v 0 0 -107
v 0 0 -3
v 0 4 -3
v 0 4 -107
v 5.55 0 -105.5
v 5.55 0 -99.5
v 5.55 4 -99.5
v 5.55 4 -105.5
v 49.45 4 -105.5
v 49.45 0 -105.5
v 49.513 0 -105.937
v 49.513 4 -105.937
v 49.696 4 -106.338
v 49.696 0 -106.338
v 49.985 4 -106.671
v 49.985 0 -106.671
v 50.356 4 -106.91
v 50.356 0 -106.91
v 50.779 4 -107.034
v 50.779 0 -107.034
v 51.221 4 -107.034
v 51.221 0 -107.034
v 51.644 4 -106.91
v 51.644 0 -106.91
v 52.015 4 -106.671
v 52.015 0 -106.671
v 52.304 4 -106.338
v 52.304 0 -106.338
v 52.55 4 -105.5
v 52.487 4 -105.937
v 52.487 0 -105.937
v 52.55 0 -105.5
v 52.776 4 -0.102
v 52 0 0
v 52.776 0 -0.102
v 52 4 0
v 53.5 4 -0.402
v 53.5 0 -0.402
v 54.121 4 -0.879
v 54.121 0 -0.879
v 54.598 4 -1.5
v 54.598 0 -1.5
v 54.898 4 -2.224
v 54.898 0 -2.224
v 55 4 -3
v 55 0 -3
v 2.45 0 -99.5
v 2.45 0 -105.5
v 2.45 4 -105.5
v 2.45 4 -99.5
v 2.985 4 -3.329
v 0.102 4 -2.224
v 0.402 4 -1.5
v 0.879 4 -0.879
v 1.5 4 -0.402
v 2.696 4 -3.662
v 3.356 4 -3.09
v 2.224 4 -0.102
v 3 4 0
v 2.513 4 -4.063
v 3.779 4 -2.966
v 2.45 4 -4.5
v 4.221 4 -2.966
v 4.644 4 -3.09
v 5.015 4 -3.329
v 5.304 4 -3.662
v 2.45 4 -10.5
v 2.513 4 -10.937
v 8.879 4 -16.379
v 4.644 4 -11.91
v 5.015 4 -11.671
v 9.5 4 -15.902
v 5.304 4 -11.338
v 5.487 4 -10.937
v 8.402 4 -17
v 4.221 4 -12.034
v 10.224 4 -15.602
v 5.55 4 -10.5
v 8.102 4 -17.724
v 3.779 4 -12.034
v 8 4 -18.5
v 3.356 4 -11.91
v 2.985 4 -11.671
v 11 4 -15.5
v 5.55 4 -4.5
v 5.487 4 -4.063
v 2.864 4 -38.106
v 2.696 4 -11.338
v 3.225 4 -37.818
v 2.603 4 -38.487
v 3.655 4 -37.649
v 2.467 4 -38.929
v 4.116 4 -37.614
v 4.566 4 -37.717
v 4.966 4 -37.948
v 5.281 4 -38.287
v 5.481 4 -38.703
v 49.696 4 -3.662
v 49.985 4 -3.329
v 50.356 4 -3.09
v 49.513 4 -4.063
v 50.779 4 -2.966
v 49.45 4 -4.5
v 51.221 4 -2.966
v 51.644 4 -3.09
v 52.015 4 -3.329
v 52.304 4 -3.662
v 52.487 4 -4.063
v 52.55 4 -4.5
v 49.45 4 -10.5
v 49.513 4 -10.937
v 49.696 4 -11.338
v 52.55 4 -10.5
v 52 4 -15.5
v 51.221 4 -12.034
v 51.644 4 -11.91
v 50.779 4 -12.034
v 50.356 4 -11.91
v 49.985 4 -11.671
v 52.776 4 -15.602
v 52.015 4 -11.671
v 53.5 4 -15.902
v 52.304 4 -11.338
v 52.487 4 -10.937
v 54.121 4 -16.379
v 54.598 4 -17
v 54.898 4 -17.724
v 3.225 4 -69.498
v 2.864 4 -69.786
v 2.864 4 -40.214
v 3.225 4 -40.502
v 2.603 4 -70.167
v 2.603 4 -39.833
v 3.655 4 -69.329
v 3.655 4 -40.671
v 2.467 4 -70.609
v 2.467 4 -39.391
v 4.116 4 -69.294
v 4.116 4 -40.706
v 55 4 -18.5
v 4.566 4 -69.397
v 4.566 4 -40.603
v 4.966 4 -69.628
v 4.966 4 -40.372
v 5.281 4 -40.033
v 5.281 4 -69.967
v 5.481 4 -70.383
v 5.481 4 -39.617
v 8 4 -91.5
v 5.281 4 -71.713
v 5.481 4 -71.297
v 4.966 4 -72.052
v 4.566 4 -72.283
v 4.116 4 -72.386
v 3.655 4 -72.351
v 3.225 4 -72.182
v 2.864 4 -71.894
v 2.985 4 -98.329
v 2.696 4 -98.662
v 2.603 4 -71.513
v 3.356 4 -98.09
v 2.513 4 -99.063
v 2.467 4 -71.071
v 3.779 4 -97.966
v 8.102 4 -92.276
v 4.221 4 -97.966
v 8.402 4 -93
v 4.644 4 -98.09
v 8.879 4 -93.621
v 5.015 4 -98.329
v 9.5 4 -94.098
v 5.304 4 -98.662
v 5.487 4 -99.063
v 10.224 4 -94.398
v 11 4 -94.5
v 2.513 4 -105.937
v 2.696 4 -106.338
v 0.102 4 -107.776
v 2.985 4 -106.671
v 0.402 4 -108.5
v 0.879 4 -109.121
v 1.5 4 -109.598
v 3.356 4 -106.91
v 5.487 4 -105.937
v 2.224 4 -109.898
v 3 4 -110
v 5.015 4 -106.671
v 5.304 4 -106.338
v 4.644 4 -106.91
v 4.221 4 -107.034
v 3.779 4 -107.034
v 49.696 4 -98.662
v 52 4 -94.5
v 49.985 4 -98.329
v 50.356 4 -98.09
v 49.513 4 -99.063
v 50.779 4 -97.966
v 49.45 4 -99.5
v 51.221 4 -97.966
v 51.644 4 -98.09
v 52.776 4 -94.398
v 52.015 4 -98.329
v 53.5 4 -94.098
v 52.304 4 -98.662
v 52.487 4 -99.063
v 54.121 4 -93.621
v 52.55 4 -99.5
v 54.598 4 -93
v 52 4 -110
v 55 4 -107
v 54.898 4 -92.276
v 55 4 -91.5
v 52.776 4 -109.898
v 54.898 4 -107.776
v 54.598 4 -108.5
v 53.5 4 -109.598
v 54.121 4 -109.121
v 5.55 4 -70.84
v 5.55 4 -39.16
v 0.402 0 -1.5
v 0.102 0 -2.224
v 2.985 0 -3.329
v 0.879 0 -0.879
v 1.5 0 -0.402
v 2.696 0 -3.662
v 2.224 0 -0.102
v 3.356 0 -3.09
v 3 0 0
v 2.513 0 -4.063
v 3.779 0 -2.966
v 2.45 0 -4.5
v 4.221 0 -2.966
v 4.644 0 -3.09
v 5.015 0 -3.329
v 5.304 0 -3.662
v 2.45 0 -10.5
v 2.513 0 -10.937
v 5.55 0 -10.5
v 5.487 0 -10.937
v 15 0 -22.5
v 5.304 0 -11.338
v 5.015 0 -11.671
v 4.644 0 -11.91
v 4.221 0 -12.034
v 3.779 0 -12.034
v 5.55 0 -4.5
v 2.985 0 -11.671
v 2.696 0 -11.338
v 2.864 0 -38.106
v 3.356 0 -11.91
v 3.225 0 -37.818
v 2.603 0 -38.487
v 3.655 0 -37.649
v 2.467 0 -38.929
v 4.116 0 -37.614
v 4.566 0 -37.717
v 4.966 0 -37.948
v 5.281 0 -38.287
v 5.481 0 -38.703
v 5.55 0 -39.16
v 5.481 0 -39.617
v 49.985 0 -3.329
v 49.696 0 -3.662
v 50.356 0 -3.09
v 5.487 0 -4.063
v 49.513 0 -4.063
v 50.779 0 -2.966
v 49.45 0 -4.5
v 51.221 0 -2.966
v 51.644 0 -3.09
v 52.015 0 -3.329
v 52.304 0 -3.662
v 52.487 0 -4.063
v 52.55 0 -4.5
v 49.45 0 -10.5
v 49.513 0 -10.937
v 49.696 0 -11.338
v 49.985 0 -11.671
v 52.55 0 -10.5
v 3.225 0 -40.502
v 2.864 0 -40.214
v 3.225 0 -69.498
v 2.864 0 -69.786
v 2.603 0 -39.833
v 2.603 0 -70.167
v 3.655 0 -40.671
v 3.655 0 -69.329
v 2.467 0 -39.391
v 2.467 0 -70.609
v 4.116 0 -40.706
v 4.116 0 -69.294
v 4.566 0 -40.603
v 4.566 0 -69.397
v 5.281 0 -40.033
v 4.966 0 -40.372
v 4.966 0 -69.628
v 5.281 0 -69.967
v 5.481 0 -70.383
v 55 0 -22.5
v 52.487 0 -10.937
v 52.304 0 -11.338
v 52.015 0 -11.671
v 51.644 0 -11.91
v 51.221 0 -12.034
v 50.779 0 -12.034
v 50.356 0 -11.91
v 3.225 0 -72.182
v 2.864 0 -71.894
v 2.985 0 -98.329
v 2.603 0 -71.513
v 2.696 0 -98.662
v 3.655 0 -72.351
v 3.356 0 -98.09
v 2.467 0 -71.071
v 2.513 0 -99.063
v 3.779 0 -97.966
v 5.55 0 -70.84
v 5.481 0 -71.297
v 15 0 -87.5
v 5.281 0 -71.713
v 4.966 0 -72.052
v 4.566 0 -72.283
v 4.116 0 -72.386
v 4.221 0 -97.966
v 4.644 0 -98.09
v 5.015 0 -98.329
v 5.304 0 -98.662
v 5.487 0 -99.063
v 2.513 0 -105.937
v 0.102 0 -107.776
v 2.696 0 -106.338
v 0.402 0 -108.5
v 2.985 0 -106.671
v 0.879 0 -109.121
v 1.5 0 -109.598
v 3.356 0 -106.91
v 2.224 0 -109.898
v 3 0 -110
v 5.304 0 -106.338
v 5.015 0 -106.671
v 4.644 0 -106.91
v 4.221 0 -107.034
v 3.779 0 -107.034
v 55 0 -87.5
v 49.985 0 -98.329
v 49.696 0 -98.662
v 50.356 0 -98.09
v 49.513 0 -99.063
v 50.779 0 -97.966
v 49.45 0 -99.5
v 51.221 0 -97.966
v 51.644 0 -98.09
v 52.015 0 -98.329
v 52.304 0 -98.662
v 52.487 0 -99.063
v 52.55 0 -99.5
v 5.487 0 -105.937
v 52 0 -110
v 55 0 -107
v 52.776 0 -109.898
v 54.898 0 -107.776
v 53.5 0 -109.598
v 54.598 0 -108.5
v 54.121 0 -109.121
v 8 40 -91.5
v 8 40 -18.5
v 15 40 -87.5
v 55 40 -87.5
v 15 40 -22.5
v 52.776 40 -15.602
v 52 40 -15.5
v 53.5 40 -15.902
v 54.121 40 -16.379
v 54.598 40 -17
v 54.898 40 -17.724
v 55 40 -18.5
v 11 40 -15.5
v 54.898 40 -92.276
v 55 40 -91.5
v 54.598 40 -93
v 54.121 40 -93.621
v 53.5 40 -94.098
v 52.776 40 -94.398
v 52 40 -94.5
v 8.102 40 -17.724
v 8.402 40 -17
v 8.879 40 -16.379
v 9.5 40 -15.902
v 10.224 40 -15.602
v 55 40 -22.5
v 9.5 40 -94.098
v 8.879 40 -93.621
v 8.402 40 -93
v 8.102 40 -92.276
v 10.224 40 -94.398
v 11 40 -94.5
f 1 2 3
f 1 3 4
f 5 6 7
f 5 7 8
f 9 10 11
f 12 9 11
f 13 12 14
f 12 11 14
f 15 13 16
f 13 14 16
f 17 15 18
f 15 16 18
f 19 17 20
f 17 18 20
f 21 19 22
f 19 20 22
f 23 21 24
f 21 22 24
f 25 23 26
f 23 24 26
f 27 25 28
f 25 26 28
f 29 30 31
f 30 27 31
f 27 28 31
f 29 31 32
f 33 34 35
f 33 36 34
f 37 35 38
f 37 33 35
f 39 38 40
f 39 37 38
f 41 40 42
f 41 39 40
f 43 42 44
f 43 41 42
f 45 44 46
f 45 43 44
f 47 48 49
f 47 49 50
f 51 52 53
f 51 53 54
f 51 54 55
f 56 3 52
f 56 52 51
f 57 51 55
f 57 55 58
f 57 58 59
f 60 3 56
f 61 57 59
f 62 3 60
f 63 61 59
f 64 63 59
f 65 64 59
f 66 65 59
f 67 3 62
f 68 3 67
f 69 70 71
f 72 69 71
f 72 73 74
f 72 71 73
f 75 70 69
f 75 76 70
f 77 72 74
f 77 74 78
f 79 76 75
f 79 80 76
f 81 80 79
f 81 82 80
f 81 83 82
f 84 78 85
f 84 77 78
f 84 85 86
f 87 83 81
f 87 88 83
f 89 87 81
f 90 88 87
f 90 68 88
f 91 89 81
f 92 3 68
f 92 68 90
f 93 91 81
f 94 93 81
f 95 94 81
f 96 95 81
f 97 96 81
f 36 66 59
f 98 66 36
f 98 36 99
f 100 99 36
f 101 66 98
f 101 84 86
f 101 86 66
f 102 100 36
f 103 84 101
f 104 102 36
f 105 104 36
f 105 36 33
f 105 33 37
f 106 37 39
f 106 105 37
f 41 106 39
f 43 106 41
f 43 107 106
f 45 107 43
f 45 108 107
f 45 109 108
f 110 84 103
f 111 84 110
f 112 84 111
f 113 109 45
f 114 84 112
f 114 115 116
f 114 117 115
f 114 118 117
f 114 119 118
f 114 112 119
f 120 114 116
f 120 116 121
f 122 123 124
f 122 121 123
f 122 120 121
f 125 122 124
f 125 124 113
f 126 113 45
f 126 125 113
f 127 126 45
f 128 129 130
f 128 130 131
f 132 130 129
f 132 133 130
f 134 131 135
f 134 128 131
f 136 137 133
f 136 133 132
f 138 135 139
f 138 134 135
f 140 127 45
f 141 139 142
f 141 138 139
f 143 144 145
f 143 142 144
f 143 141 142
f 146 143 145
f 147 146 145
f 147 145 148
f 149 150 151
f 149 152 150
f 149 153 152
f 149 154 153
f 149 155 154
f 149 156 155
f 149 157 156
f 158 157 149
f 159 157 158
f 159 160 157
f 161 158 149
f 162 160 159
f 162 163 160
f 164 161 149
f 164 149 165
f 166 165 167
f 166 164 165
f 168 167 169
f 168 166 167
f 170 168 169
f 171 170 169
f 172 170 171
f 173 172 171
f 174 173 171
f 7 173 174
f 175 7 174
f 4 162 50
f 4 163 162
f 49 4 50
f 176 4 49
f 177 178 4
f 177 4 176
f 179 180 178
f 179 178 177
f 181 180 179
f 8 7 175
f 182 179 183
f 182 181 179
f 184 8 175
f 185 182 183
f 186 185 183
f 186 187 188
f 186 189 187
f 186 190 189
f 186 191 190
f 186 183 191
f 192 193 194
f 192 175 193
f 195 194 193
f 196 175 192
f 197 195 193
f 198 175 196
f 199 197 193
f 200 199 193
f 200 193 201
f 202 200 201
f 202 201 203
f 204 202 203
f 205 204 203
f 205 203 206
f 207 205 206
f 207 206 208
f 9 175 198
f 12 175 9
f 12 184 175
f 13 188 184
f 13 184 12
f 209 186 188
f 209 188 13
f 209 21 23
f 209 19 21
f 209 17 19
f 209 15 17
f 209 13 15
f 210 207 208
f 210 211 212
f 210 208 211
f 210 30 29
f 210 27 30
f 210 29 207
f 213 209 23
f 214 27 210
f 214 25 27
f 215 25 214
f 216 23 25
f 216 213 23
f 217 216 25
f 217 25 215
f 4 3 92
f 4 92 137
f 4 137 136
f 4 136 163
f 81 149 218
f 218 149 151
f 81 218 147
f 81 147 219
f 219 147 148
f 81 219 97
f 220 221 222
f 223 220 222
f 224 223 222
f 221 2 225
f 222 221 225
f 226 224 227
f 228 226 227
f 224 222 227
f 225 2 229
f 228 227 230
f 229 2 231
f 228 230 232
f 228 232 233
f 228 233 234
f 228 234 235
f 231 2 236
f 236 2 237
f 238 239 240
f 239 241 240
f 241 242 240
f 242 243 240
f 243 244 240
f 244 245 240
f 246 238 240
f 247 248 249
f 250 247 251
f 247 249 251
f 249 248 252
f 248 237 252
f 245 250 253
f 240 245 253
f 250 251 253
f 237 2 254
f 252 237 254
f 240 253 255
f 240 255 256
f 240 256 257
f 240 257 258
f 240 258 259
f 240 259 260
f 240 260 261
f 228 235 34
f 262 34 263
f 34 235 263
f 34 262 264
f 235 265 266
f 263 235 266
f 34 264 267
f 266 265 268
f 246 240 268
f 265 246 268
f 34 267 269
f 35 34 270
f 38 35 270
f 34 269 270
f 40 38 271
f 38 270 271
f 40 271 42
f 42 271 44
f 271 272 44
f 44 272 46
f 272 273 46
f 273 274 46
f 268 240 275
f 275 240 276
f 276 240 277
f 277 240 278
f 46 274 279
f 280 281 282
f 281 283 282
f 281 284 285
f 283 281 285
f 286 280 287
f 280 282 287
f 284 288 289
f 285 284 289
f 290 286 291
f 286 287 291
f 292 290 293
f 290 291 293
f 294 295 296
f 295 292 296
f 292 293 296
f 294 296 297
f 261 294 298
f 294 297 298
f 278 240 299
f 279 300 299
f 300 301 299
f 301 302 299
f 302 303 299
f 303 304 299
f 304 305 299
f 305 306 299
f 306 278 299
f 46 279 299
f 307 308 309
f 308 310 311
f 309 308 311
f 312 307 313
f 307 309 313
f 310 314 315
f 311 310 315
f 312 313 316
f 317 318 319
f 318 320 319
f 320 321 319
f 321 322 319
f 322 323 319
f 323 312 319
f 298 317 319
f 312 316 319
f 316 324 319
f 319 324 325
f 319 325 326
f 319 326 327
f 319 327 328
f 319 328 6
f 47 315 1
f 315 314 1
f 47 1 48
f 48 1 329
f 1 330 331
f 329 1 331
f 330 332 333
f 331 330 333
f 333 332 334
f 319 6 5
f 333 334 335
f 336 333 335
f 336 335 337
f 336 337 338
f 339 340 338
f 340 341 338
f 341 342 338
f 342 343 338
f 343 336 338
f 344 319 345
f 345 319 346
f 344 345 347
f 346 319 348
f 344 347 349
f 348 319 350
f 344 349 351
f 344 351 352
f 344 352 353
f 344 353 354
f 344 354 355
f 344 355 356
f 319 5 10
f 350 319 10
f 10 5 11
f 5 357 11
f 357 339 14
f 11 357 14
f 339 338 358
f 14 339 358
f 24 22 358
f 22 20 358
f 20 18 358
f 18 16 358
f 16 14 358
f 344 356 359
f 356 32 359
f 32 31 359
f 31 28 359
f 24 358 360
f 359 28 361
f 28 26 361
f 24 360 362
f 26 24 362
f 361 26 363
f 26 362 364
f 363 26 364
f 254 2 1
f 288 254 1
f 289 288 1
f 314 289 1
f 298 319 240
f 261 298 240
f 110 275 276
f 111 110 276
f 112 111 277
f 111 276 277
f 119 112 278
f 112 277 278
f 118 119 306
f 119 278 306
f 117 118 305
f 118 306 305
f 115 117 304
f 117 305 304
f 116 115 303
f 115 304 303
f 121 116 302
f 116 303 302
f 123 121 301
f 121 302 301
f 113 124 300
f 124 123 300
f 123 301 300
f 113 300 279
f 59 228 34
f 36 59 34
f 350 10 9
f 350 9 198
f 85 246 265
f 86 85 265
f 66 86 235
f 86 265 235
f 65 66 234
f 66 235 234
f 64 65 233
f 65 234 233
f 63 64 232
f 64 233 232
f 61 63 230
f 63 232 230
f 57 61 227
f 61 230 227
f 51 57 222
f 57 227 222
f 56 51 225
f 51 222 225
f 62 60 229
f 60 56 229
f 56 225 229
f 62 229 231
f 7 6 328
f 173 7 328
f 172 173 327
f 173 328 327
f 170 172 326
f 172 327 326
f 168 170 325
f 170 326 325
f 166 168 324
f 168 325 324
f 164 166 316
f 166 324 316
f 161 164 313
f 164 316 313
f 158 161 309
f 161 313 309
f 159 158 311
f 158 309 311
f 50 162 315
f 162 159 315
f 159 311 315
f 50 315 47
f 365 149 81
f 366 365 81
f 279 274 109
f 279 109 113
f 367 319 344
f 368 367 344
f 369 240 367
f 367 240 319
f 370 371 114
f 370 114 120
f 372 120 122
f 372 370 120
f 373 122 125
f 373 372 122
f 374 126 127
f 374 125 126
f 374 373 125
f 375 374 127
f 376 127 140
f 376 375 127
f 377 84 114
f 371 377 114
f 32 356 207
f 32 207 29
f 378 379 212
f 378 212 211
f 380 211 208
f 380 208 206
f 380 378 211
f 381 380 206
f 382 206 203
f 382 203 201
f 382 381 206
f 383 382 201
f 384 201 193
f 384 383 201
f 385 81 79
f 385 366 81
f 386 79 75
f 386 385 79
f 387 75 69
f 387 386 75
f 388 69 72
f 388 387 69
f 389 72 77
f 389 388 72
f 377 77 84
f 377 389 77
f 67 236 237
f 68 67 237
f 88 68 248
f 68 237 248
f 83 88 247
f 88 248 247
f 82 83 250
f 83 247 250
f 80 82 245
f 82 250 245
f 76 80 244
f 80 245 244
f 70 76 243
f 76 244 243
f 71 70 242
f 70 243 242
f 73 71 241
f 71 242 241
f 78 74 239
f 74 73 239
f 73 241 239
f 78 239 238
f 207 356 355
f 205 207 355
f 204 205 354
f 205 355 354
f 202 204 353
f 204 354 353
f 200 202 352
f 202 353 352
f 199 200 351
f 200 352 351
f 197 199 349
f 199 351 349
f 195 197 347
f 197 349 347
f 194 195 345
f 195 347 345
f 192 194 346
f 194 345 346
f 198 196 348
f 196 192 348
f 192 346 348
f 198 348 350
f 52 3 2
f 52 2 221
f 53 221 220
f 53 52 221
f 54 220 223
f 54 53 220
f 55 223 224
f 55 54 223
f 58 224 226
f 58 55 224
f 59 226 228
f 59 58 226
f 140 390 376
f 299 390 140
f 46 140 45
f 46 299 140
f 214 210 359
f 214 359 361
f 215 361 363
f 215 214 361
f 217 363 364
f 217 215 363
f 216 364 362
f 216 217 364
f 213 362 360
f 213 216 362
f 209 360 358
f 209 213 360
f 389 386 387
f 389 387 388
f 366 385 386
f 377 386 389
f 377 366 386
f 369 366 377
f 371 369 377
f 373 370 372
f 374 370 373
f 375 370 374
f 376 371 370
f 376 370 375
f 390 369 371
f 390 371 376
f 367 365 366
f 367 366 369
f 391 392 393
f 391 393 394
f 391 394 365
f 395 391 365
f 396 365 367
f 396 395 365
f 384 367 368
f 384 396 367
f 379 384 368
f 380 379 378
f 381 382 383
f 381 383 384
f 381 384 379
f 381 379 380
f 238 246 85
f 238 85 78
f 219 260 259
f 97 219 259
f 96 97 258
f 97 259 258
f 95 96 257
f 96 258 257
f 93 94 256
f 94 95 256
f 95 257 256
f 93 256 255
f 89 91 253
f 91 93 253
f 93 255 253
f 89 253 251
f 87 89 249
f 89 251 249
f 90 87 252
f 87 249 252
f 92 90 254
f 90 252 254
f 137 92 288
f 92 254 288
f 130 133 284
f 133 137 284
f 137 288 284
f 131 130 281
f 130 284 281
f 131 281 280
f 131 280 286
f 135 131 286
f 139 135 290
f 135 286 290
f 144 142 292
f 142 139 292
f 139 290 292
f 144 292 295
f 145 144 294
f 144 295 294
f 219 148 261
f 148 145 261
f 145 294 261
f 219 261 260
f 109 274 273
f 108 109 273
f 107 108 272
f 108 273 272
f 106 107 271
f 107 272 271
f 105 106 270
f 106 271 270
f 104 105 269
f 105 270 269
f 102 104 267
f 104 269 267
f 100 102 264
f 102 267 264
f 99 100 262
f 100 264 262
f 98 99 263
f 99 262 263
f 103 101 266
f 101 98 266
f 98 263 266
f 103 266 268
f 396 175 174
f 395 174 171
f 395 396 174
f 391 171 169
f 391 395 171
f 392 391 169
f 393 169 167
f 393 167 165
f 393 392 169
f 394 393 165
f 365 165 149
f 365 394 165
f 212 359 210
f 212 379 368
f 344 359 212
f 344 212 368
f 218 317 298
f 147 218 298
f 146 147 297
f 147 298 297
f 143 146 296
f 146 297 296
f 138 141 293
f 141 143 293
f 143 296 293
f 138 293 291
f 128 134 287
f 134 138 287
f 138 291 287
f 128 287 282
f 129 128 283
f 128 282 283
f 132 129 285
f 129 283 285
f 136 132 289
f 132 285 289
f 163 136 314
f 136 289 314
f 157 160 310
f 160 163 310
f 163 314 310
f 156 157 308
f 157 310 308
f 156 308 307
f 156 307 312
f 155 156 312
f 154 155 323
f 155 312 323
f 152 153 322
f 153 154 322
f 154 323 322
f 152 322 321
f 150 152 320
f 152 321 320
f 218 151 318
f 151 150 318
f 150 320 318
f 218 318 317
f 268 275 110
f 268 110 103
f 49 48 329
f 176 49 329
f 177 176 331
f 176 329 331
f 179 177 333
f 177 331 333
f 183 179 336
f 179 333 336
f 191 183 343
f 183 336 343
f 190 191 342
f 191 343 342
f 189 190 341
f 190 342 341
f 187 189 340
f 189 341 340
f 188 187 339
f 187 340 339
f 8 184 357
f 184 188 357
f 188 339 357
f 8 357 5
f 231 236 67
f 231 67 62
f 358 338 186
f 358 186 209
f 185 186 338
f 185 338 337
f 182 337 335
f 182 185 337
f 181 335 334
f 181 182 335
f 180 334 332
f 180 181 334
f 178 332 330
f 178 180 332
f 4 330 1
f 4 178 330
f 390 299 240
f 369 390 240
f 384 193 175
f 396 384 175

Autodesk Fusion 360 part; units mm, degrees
sketch "Sketch1" plane through (0, 0, 0) normal (0, 1, 0) x (1, 0, 0)
  line L0 (0, 0) -> (55, 0)
  line L1 (0, 0) -> (0, 110)
  line L2 (0, 110) -> (55, 110)
  line L3 (55, 110) -> (55, 94.5)
  line L4 (55, 94.5) -> (8, 94.5)
  line L5 (8, 94.5) -> (8, 15.5)
  line L6 (8, 15.5) -> (55, 15.5)
  line L7 (55, 15.5) -> (55, 0)
  line L8 (55, 15.5) -> (55, 22.5)
  line L9 (55, 22.5) -> (15, 22.5)
  line L10 (15, 22.5) -> (15, 87.5)
  line L11 (15, 87.5) -> (55, 87.5)
  line L12 (55, 87.5) -> (55, 94.5)
  line L13 (4, 0) -> (4, 110) construction
  circle A0 centre (51, 7.5) radius 1.55
  circle A1 centre (4, 7.5) radius 1.55
  circle A2 centre (4, 102.5) radius 1.55
  circle A3 centre (51, 102.5) radius 1.55
  circle A4 centre (4, 70.84) radius 1.55
  circle A5 centre (4, 39.16) radius 1.55
  line L14 (52.55, 4.5) -> (52.55, 10.5)
  arc A6 (52.55, 10.5) -> (49.45, 10.5) centre (51, 10.5) ccw
  line L15 (49.45, 10.5) -> (49.45, 4.5)
  arc A7 (49.45, 4.5) -> (52.55, 4.5) centre (51, 4.5) ccw
  line L16 (51, 4.5) -> (51, 10.5) construction
  line L17 (51, 99.5) -> (51, 105.5) construction
  line L18 (5.55, 99.5) -> (5.55, 105.5)
  arc A8 (5.55, 105.5) -> (2.45, 105.5) centre (4, 105.5) ccw
  line L19 (2.45, 105.5) -> (2.45, 99.5)
  arc A9 (2.45, 99.5) -> (5.55, 99.5) centre (4, 99.5) ccw
  line L20 (4, 99.5) -> (4, 105.5) construction
  line L21 (52.55, 99.5) -> (52.55, 105.5)
  arc A10 (52.55, 105.5) -> (49.45, 105.5) centre (51, 105.5) ccw
  line L22 (49.45, 105.5) -> (49.45, 99.5)
  arc A11 (49.45, 99.5) -> (52.55, 99.5) centre (51, 99.5) ccw
  line L23 (51, 99.5) -> (51, 105.5) construction
  line L24 (5.55, 4.5) -> (5.55, 10.5)
  arc A12 (5.55, 10.5) -> (2.45, 10.5) centre (4, 10.5) ccw
  line L25 (2.45, 10.5) -> (2.45, 4.5)
  arc A13 (2.45, 4.5) -> (5.55, 4.5) centre (4, 4.5) ccw
  line L26 (4, 4.5) -> (4, 10.5) construction
  point P0 (51, 7.5)
  point P1 (51, 102.5)
  point P2 (4, 102.5)
  point P3 (51, 102.5)
  point P4 (4, 7.5)
  dimension "d1" = 65
  dimension "d2" = 7
  dimension "d3" = 15.5
  dimension "d4" = 7
  dimension "d5" = 8
  dimension "d7" = 40
  dimension "d8" = 4
  dimension "d9" = 3.1
  dimension "d10" = 3.1
  dimension "d11" = 3.1
  dimension "d12" = 3.1
  dimension "d14" = 4
  dimension "d15" = 4
  dimension "d34" = 7.5
  dimension "d35" = 7.5
  dimension "d36" = 7.5
  dimension "d37" = 7.5
  dimension "d38" = 3.1
  dimension "d39" = 3.1
  dimension "d40" = 31.66
  dimension "d41" = 31.66
  dimension "d42" = 3.1
  dimension "d43" = 3.1
  dimension "d44" = 3.1
  dimension "d45" = 3.1
  dimension "d46" = 3
  dimension "d47" = 3
  dimension "d48" = 3
  dimension "d49" = 3
extrude "Extrude1" add sketch "Sketch1" along normal blind 4 contours L0 L1 L2 L3 L4 L5 L6 L7
extrude "Extrude2" add sketch "Sketch1" along normal blind 40 contours L4 L5 L6 L8 L9 L10 L11 L12
fillet "Fillet1" radius 3 6 edges at (55, 2, 0) (8, 22, -15.5) (0, 2, 0) (55, 2, -110) (8, 22, -94.5) (0, 2, -110)
fillet "Fillet1" radius 3 2 edges at (55, 22, -94.5) (55, 22, -15.5)
equation "d4 = d2"
equation "d10 = d9"
equation "d15 = d14"
equation "d42 = d9"
equation "d43 = d9"
equation "d44 = d9"
equation "d45 = d9"
equation "d47 = d46"
equation "d48 = d46"
equation "d49 = d46"
